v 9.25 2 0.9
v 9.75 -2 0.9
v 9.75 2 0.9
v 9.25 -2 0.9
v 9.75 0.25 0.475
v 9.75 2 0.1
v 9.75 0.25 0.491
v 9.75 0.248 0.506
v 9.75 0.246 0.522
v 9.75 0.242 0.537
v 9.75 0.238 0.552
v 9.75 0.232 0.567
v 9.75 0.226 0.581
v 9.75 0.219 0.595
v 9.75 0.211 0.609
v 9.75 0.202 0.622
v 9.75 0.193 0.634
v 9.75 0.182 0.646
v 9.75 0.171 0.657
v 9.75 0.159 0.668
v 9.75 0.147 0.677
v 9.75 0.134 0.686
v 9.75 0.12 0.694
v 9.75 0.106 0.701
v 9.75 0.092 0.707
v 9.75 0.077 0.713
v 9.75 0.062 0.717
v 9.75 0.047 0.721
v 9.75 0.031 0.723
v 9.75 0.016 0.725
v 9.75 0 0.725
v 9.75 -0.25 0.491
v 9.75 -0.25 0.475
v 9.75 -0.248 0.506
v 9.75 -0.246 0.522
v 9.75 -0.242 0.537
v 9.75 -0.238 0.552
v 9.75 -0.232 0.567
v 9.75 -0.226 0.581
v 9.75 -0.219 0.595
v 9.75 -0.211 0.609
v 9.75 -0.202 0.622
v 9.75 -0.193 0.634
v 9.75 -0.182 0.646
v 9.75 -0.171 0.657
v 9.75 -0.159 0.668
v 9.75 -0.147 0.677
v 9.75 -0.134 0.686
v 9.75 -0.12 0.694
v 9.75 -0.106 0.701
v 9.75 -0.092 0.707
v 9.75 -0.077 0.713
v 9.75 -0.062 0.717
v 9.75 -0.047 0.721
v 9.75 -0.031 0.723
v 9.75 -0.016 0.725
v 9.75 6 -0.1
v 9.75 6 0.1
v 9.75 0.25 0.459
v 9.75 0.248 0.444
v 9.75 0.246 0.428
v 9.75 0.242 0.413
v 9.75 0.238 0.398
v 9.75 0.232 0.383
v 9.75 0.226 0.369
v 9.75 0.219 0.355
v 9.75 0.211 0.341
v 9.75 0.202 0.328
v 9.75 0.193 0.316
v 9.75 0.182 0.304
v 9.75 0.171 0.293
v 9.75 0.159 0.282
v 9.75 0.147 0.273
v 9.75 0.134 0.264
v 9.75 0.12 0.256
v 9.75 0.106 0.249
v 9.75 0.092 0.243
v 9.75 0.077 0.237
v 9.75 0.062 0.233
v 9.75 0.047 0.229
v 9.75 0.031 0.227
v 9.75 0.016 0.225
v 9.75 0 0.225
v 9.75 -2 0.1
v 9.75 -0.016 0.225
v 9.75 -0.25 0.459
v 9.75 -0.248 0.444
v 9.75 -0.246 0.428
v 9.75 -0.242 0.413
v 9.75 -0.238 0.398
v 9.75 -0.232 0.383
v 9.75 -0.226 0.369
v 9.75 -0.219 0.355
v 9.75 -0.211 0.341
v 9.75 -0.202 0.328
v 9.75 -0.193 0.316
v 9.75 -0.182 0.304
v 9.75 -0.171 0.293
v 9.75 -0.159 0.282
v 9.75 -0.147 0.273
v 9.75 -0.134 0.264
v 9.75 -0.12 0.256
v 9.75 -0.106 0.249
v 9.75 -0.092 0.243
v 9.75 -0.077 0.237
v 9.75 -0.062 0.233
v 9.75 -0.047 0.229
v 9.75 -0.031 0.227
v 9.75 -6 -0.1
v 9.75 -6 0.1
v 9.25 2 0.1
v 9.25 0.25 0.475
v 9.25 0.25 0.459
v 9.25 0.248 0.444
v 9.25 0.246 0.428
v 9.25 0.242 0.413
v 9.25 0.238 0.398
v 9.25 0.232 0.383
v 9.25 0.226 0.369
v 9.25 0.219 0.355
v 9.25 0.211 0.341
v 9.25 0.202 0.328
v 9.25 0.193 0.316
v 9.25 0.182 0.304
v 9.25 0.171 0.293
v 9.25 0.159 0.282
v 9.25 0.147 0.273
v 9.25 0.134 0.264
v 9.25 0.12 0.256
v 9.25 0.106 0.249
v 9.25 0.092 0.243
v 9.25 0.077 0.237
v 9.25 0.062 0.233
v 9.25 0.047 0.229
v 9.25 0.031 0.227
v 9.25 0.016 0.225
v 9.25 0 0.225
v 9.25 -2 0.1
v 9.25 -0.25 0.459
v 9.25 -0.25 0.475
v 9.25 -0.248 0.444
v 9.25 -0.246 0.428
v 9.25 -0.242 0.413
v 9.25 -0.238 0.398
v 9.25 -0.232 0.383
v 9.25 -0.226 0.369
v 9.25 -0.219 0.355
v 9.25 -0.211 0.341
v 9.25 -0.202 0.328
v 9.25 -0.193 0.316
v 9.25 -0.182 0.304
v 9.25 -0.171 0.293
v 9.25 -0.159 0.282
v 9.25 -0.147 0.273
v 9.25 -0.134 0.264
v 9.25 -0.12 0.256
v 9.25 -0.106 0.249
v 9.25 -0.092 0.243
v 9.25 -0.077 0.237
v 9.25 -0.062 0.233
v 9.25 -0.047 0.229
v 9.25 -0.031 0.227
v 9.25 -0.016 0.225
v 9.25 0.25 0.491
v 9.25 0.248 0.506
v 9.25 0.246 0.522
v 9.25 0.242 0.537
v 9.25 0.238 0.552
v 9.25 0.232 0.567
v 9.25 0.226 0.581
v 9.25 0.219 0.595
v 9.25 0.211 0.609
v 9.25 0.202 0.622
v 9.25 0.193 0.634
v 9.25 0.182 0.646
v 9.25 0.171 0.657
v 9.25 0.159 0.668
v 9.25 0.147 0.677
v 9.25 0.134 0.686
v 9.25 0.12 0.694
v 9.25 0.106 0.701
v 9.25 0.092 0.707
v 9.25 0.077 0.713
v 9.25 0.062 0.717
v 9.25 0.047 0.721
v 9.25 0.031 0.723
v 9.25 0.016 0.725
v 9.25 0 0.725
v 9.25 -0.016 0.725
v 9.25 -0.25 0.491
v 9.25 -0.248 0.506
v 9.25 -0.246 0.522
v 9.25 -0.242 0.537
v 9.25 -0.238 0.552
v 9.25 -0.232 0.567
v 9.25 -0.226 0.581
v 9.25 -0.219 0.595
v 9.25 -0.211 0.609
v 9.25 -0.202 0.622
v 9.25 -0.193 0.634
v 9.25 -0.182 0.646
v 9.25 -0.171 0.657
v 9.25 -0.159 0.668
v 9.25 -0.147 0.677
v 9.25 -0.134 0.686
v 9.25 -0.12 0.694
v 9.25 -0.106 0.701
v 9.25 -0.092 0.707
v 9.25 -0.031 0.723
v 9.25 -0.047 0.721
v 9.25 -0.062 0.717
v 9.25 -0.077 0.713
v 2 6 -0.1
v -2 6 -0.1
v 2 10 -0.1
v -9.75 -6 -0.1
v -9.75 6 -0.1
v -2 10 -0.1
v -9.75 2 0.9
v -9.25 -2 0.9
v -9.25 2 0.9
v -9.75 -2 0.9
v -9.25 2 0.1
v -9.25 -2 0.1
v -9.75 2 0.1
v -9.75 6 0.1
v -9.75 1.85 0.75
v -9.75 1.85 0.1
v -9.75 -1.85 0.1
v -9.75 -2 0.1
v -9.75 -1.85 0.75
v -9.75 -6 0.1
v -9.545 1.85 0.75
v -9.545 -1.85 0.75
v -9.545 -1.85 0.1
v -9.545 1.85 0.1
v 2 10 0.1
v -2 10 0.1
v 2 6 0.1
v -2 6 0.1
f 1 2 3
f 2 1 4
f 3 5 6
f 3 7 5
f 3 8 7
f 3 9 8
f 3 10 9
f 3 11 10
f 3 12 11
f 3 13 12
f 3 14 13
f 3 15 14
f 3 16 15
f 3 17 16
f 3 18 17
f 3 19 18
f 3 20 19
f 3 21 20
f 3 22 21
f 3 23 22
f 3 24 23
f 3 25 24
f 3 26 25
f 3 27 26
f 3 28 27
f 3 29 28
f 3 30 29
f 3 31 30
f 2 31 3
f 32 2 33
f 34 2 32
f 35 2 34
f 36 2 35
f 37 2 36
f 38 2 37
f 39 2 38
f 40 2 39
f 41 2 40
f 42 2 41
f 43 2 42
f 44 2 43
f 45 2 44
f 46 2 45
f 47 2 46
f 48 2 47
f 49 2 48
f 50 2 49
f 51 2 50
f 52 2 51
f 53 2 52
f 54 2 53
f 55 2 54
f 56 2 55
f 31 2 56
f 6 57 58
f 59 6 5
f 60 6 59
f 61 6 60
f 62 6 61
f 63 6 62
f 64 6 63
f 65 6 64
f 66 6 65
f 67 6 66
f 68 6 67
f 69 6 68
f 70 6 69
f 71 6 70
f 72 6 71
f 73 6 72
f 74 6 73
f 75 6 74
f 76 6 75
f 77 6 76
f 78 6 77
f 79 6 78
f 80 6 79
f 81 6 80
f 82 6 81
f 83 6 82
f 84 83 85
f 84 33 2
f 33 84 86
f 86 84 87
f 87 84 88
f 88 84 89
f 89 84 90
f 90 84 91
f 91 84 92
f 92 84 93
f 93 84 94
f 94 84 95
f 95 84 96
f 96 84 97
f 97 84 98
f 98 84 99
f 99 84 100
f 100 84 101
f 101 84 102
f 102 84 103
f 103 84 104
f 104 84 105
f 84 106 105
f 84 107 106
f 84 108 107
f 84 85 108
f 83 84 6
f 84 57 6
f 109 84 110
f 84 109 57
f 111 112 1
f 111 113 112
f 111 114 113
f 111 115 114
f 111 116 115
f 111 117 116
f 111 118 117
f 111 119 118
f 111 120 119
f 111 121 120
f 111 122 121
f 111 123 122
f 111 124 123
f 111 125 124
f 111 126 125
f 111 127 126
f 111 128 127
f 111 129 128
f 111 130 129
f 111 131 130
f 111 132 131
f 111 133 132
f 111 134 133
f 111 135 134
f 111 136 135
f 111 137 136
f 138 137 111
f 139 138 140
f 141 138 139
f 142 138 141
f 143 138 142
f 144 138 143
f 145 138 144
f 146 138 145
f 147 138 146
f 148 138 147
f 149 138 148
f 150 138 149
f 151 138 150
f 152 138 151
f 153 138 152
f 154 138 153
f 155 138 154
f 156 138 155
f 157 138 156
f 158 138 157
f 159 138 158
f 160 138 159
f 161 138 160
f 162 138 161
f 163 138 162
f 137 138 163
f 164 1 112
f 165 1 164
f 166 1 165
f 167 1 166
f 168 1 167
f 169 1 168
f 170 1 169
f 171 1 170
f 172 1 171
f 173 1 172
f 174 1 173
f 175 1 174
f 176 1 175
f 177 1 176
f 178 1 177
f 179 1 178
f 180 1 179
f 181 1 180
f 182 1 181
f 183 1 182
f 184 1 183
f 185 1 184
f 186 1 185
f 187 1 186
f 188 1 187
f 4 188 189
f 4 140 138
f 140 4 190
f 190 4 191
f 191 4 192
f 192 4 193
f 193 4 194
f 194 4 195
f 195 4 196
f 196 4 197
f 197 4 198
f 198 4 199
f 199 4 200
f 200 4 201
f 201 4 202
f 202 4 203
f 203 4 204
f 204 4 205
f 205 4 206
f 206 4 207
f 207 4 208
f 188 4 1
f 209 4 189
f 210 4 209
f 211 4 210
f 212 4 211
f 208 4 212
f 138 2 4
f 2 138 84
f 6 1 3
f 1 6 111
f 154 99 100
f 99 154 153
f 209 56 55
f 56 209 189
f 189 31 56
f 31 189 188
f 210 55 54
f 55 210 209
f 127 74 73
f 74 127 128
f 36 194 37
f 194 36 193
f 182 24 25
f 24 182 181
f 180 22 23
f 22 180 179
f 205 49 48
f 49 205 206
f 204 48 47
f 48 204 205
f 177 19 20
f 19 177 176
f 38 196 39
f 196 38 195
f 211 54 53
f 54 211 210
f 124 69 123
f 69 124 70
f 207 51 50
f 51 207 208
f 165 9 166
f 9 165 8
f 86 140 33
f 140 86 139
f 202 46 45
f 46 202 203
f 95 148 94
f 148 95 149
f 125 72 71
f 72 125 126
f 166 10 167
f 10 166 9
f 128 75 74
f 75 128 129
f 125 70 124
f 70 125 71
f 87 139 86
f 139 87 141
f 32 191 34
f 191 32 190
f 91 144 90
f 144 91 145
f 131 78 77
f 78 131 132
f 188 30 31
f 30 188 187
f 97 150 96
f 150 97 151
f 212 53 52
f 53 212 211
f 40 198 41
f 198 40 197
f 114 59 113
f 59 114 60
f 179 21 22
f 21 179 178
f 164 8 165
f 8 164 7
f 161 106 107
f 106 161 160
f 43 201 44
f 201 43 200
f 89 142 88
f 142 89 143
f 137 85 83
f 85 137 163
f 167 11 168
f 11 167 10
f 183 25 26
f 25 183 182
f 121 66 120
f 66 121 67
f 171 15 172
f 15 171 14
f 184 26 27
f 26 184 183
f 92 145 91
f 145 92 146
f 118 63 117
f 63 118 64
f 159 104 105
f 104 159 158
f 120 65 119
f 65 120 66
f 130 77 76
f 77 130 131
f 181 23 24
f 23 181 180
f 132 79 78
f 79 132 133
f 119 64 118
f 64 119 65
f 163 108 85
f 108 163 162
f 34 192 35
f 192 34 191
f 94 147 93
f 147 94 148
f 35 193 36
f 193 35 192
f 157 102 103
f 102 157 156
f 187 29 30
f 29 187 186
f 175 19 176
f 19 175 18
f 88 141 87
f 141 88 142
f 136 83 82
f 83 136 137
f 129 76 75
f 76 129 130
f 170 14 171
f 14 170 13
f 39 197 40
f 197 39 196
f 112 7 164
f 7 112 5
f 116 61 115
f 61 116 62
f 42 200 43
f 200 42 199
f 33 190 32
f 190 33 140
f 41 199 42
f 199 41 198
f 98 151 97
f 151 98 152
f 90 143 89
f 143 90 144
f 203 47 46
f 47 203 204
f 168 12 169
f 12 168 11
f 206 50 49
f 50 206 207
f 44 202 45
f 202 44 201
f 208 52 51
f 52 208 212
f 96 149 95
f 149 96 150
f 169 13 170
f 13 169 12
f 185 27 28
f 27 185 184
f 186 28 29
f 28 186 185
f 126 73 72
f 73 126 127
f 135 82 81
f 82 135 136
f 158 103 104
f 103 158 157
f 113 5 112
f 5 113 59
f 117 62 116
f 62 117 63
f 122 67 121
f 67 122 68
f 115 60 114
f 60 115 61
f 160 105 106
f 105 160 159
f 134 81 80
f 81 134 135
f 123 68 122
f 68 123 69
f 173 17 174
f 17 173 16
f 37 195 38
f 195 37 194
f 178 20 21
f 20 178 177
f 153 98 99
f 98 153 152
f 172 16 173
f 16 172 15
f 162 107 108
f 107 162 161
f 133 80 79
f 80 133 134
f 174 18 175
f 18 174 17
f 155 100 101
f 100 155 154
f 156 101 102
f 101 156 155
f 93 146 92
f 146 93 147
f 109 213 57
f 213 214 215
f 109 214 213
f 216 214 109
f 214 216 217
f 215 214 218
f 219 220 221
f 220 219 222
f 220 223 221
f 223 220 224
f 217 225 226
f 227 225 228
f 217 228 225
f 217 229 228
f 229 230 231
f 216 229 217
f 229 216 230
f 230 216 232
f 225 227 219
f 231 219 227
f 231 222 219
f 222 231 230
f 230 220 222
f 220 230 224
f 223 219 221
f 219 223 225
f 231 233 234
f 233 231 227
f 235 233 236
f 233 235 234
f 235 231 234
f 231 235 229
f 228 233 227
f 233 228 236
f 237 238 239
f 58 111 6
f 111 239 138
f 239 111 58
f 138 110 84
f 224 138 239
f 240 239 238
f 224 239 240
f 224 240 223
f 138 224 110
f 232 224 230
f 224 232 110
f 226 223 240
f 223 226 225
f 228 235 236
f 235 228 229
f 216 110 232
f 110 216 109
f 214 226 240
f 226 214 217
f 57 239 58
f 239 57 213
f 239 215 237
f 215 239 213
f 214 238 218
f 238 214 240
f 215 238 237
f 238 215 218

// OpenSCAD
rotate([180, 0, 0]) {
	cube([19.5, 12.0, 0.2], center=true);

	translate([0, -7.5, 0]) {
		cube([4.0, 5.0, 0.2], center=true);
	}

	difference() {
		translate([9.50, 0, 0]) {
			rotate([0, 90, 0]) {
				difference() {
					cube([1.8, 4, 0.5], center=true);
					translate([0.475, 0, 0]) {
						cylinder(r=0.25, h=10, center=true, $fn=100);
					}
				}
			}
		}
		translate([0, 0, 2.6]) {
			cube([25, 20, 5], center=true);
		}
	}

	difference() {
		translate([-9.50, 0, 0]) {
			rotate([0, 90, 0]) {
				difference() {
					cube([1.8, 4, 0.5], center=true);
					translate([0.4, 0, -0.15]) {
						cube([0.7, 3.7, 0.21], center=true);
						}
				}
			}
		}
		translate([0, 0, 2.6]) {
			cube([25, 20, 5], center=true);
		}
	}
}
